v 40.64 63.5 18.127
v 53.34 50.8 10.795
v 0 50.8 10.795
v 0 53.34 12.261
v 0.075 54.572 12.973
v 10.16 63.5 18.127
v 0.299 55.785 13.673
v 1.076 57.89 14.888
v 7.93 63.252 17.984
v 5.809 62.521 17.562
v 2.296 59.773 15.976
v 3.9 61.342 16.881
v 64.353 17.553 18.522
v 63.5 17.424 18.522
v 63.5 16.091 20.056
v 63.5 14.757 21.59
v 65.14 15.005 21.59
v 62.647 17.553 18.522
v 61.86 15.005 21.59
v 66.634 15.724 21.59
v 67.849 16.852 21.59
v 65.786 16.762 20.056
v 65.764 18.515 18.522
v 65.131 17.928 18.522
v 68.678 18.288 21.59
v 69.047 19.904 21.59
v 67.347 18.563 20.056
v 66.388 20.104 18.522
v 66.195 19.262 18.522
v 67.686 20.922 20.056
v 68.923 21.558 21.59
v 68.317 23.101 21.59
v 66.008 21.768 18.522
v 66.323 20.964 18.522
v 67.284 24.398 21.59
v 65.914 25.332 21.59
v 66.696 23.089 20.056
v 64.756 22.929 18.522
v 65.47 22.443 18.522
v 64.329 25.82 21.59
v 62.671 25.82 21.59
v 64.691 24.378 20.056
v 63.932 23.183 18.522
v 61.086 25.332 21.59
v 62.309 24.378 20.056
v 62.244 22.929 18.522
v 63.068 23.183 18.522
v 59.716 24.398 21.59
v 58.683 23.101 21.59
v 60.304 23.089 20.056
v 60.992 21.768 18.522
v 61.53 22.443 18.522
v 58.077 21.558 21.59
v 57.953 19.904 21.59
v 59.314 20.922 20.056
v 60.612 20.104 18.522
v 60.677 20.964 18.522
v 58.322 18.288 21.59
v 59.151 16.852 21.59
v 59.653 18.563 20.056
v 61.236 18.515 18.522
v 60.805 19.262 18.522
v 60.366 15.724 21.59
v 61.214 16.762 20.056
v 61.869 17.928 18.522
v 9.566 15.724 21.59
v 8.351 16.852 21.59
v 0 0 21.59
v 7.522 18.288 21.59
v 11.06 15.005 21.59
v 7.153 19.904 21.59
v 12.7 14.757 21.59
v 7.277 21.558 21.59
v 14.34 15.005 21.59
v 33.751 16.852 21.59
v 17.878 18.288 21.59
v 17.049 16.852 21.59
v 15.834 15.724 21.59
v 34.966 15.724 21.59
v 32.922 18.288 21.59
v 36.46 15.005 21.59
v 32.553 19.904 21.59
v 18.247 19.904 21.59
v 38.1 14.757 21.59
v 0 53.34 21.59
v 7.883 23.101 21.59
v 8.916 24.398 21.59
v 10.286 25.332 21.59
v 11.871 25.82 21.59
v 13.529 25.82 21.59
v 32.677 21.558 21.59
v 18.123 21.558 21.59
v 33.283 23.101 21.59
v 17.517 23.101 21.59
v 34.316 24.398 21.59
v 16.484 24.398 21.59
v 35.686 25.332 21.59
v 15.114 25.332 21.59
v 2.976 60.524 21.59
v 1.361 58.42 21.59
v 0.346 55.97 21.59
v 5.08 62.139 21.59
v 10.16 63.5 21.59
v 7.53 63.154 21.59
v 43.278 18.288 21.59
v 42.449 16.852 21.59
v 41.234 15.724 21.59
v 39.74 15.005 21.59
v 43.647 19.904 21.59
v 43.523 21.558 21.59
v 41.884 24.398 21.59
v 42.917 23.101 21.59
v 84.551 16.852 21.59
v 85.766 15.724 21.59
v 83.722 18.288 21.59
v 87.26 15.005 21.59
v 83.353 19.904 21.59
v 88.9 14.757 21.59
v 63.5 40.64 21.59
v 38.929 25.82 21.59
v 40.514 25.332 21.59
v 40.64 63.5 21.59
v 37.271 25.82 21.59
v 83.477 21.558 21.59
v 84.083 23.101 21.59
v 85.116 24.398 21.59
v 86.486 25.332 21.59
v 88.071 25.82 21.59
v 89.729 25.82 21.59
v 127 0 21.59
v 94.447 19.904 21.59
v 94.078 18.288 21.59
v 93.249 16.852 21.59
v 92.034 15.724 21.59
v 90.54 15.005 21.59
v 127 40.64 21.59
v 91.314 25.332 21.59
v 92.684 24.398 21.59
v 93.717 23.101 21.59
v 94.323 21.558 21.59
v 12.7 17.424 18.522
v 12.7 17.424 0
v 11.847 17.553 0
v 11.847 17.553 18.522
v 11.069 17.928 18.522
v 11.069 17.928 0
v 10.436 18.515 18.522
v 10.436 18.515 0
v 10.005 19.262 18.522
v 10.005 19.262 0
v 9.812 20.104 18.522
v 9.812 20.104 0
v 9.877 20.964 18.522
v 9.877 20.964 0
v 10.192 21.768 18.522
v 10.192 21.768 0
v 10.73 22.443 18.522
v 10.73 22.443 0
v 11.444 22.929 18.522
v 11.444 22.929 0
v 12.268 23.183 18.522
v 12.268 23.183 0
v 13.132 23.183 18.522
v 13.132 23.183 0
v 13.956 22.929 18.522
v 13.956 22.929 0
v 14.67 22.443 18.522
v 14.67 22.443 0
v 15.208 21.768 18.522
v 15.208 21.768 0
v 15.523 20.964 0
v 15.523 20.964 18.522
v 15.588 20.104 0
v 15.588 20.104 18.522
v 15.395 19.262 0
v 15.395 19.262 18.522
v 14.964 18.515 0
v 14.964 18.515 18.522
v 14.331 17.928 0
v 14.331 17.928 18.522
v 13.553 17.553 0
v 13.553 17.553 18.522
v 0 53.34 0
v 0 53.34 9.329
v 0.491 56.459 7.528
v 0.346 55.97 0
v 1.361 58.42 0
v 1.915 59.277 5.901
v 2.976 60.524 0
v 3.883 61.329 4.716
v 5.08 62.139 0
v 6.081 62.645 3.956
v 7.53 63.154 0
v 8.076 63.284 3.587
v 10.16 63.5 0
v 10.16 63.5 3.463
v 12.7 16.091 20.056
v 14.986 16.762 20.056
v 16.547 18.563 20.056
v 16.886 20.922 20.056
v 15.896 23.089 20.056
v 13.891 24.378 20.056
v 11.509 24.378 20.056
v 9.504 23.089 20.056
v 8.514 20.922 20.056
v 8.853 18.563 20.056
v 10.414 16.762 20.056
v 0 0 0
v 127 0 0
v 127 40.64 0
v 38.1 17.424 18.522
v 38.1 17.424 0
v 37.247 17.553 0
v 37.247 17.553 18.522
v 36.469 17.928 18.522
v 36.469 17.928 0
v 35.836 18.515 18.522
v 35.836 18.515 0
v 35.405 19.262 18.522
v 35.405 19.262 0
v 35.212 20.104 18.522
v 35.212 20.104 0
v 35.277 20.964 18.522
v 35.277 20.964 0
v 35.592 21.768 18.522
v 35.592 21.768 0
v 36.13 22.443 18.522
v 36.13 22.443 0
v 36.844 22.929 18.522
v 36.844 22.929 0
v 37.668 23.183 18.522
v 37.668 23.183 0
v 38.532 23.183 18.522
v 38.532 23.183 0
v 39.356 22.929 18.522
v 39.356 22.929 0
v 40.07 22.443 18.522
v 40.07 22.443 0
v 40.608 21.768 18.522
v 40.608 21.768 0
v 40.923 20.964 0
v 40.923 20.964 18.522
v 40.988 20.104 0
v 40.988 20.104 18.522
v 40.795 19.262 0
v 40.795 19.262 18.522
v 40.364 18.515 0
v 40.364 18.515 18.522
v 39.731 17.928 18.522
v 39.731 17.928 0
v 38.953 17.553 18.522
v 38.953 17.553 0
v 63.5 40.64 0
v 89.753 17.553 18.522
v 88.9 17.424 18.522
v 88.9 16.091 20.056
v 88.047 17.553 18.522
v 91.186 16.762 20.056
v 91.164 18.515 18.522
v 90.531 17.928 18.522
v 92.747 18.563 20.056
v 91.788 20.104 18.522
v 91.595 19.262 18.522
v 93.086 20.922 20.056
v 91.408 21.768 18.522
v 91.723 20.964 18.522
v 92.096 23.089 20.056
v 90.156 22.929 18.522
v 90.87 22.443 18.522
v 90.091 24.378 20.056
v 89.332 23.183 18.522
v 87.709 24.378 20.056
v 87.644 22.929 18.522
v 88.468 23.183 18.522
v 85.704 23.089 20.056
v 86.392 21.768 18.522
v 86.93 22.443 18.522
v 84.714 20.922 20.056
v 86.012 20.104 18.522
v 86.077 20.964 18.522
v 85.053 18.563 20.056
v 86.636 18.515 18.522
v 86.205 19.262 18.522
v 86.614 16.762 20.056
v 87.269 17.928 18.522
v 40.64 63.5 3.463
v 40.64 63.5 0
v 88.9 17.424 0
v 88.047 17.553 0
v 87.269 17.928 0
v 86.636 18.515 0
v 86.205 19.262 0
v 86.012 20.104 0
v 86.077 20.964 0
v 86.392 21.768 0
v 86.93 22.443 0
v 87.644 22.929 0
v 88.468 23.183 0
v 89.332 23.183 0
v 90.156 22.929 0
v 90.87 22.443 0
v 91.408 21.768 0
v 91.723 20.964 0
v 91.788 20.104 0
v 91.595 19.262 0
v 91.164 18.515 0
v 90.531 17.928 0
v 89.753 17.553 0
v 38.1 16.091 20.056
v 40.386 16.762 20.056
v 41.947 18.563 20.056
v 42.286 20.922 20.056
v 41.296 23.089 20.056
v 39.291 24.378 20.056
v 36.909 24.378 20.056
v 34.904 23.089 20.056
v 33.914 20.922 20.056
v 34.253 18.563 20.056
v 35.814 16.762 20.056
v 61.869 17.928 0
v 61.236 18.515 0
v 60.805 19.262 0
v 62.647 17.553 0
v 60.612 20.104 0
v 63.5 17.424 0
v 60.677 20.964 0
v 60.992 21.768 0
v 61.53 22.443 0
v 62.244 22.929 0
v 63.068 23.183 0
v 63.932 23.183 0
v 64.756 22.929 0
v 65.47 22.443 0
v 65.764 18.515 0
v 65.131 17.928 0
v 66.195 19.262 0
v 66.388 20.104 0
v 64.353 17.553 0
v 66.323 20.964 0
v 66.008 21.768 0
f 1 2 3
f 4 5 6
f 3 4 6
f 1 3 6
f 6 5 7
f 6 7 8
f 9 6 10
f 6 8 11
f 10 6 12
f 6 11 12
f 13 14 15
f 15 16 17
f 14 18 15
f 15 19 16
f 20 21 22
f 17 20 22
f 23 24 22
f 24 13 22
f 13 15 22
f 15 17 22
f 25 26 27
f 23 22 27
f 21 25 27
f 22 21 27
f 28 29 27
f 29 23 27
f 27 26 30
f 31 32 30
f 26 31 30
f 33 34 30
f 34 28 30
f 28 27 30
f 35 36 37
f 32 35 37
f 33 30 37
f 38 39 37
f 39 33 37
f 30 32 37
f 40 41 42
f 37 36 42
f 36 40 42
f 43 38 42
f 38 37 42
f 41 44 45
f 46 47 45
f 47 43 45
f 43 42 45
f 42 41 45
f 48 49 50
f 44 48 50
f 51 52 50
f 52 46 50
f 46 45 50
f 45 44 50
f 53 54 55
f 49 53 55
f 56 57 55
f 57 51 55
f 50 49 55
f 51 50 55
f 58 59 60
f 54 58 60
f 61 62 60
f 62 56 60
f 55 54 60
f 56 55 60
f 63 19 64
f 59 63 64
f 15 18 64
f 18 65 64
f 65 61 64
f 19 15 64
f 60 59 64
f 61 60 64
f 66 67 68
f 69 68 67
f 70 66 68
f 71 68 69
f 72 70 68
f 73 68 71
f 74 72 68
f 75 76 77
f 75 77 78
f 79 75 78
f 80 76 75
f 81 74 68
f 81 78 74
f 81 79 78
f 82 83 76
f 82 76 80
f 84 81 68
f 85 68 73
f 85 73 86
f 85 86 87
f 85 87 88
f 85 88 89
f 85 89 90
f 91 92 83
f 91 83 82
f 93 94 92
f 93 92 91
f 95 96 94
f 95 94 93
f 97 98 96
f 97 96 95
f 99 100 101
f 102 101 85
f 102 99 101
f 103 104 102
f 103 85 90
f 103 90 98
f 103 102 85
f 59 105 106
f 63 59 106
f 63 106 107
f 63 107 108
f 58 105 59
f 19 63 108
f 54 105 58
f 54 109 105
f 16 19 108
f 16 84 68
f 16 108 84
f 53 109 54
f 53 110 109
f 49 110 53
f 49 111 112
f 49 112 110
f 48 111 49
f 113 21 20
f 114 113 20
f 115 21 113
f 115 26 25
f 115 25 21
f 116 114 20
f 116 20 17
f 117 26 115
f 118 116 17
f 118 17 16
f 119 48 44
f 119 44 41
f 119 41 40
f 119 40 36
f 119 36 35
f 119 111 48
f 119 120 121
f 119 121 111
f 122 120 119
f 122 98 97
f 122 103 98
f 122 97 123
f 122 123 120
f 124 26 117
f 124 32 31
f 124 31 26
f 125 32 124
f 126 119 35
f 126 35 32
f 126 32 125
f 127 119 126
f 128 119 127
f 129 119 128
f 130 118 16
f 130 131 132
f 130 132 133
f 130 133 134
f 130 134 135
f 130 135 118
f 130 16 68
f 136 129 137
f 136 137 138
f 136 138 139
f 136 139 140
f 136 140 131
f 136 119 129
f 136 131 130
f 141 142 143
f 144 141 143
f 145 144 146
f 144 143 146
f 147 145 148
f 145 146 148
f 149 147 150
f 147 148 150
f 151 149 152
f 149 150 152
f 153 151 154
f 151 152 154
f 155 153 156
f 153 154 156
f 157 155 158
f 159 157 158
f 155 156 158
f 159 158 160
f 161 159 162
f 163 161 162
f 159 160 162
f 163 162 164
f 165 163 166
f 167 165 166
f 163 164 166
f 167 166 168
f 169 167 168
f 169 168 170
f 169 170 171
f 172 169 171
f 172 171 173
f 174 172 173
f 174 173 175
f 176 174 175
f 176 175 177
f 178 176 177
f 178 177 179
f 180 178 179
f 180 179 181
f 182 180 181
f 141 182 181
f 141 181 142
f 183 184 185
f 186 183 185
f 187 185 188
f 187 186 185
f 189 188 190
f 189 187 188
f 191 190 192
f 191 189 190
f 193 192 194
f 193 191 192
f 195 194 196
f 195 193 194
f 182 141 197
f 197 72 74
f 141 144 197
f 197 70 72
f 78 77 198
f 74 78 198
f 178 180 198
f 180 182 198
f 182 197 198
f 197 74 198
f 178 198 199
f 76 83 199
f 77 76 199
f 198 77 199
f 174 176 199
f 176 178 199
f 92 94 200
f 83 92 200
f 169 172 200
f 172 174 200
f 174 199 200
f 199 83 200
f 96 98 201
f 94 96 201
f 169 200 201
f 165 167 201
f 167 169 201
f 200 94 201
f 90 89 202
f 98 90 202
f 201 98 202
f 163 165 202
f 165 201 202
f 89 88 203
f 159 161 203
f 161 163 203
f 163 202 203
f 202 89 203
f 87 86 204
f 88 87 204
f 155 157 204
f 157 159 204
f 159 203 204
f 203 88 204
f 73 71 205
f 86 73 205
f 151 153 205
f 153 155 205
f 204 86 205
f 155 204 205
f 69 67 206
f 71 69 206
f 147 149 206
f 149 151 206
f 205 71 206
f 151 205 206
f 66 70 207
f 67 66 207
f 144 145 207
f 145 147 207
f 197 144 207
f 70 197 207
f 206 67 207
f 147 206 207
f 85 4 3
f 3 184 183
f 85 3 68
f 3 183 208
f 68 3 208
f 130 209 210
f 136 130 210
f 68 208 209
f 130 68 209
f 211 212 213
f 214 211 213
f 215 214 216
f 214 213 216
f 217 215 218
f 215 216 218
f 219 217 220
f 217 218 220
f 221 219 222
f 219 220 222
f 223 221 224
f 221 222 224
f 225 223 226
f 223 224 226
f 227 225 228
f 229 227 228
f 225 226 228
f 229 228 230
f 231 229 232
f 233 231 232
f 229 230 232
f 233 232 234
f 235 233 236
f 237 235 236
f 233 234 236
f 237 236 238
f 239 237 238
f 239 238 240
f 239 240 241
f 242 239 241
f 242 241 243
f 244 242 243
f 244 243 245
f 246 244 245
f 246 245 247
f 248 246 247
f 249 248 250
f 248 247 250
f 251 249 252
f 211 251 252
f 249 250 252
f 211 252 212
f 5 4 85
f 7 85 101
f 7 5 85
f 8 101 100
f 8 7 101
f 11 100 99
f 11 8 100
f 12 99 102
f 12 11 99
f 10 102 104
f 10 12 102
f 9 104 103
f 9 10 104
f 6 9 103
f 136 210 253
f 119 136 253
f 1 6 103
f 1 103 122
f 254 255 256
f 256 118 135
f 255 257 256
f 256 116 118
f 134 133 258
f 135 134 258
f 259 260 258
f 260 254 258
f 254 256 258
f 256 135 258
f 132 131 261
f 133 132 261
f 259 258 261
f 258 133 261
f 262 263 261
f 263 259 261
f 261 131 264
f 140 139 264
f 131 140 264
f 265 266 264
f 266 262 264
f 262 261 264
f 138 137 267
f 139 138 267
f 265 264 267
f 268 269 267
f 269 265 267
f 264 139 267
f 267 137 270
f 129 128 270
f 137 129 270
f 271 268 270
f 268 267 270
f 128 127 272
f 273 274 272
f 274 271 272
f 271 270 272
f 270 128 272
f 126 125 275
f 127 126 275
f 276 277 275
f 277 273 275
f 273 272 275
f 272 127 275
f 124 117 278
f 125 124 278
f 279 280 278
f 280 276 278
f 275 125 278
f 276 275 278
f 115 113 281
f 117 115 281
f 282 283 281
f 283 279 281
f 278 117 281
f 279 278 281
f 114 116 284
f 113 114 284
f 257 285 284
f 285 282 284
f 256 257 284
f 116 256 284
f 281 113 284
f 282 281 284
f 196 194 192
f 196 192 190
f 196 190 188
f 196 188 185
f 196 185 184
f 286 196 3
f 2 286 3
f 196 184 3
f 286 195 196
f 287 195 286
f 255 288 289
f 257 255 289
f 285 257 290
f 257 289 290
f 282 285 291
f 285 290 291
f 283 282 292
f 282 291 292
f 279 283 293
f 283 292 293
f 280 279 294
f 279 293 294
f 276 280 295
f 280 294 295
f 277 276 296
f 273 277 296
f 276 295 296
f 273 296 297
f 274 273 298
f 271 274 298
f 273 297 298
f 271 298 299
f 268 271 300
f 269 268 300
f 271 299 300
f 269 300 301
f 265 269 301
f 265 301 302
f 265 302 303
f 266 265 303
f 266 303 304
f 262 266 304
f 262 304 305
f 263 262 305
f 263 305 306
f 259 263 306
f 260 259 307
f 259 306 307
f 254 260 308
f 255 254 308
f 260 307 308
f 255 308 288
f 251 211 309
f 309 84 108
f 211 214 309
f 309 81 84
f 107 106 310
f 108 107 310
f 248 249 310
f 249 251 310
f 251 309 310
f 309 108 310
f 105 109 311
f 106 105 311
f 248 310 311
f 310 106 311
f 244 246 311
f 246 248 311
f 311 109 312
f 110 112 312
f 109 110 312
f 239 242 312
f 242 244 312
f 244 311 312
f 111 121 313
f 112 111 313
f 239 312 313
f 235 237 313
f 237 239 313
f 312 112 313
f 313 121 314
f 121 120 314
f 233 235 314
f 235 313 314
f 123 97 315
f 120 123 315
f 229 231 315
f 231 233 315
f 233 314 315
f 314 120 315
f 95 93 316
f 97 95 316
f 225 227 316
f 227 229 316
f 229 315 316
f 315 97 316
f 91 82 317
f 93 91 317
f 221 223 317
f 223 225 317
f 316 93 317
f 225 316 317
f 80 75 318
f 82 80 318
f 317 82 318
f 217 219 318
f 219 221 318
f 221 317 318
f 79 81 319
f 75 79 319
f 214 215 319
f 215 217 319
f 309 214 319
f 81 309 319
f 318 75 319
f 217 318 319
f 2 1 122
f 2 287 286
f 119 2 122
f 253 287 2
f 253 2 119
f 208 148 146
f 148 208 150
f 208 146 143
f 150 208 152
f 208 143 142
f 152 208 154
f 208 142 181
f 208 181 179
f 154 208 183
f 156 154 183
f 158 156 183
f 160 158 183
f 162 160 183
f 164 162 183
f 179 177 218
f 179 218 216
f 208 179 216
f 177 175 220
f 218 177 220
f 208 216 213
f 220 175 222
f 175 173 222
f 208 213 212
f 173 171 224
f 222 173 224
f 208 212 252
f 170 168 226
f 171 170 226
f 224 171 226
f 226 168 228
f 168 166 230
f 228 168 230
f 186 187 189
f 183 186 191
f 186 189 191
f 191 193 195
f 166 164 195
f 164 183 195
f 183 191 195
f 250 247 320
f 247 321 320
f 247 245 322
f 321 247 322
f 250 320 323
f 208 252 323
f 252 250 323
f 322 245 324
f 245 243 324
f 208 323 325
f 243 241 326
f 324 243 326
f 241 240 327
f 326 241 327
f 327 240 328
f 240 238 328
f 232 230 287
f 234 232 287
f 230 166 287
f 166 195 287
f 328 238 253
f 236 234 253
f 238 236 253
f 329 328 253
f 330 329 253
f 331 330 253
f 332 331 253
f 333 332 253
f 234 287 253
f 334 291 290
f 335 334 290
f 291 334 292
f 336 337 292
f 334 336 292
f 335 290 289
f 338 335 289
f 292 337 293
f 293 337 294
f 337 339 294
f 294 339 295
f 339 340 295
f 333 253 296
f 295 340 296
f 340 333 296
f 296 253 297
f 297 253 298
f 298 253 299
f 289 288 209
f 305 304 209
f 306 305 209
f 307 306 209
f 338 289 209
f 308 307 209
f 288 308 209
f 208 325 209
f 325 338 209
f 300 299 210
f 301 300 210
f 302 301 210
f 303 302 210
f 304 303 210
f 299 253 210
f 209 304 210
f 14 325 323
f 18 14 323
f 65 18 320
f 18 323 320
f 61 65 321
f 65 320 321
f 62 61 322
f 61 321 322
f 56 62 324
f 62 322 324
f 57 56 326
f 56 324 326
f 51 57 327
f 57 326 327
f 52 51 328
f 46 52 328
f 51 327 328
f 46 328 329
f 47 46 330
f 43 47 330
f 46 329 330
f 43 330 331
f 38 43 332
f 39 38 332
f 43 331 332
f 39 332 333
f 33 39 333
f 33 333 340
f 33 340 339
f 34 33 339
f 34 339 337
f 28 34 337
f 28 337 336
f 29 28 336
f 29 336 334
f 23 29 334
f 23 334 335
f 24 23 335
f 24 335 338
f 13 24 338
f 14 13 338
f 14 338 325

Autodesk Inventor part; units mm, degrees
ref_plane "YZ Plane" through (0, 0, 0) normal (1, 0, 0) x (0, 1, 0)
ref_plane "XZ Plane" through (0, 0, 0) normal (0, 1, 0) x (-1, 0, 0)
ref_plane "XY Plane" through (0, 0, 0) normal (0, 0, 1) x (1, 0, 0)
sketch "Sketch1" plane through (0, 0, 0) normal (0, 0, 1) x (1, 0, 0)
  line L0 (0, 0) -> (127, 0)
  line L1 (127, 0) -> (127, 40.64)
  line L2 (127, 40.64) -> (0, 40.64)
  line L3 (0, 40.64) -> (0, 0)
  line L4 (0, 40.64) -> (0, 53.34)
  arc A0 (10.16, 63.5) -> (0, 53.34) centre (10.16, 53.34) ccw
  line L5 (10.16, 63.5) -> (40.64, 63.5)
  line L6 (40.64, 63.5) -> (63.5, 40.64)
  point P0 (63.5, 0)
  dimension "width" = 127
  dimension "height" = 63.5
  dimension "d2" = 10.16
  dimension "d3" = 45
  dimension "base_height" = 40.64
extrude "Extrusion1" add sketch "Sketch1" along normal blind 21.59
sketch "Sketch3" plane through (0, 0, 0) normal (-1, 0, 0) x (0, 0, 1)
  line L0 (18.1273, 63.5) -> (3.4627, 63.5)
  line L1 (3.4627, 63.5) -> (10.795, 50.8)
  line L2 (10.795, 50.8) -> (18.1273, 63.5)
  line L3 (0, 0) -> (21.59, 0) projected
  line L4 (0, 63.5) -> (21.59, 63.5) projected
  point P0 (10.795, 0)
  dimension "d20" = 12.7
extrude "Extrusion2" cut sketch "Sketch3" against normal through all
sketch "Sketch2" plane through (0, 0, 21.59) normal (0, 0, 1) x (1, 0, 0)
  line L0 (0, 53.34) -> (0, 0) projected
  line L1 (0, 0) -> (127, 0) projected
  point P0 (12.7, 20.32)
  dimension "pat_offset" = 12.7
  dimension "d9" = 20.32
hole "Hole1" at (12.7, 20.32, 21.59) direction (0, 0, -1) diameter 5.7912 end through all countersink diameter 11.1252 countersink angle 82 clearance for "Flat Head Machine Screw (82)" size "#12" standard "Ansi Unified Screw Threads"
pattern_linear "Rectangular Pattern1" count 4 spacing 25.4 along (1, 0, 0) of "Hole1"
equation "\"height\" = 0.5 * width"
equation "\"d9\" = 0.5 * base_height"
properties part number "Parameter part" material "Steel"
